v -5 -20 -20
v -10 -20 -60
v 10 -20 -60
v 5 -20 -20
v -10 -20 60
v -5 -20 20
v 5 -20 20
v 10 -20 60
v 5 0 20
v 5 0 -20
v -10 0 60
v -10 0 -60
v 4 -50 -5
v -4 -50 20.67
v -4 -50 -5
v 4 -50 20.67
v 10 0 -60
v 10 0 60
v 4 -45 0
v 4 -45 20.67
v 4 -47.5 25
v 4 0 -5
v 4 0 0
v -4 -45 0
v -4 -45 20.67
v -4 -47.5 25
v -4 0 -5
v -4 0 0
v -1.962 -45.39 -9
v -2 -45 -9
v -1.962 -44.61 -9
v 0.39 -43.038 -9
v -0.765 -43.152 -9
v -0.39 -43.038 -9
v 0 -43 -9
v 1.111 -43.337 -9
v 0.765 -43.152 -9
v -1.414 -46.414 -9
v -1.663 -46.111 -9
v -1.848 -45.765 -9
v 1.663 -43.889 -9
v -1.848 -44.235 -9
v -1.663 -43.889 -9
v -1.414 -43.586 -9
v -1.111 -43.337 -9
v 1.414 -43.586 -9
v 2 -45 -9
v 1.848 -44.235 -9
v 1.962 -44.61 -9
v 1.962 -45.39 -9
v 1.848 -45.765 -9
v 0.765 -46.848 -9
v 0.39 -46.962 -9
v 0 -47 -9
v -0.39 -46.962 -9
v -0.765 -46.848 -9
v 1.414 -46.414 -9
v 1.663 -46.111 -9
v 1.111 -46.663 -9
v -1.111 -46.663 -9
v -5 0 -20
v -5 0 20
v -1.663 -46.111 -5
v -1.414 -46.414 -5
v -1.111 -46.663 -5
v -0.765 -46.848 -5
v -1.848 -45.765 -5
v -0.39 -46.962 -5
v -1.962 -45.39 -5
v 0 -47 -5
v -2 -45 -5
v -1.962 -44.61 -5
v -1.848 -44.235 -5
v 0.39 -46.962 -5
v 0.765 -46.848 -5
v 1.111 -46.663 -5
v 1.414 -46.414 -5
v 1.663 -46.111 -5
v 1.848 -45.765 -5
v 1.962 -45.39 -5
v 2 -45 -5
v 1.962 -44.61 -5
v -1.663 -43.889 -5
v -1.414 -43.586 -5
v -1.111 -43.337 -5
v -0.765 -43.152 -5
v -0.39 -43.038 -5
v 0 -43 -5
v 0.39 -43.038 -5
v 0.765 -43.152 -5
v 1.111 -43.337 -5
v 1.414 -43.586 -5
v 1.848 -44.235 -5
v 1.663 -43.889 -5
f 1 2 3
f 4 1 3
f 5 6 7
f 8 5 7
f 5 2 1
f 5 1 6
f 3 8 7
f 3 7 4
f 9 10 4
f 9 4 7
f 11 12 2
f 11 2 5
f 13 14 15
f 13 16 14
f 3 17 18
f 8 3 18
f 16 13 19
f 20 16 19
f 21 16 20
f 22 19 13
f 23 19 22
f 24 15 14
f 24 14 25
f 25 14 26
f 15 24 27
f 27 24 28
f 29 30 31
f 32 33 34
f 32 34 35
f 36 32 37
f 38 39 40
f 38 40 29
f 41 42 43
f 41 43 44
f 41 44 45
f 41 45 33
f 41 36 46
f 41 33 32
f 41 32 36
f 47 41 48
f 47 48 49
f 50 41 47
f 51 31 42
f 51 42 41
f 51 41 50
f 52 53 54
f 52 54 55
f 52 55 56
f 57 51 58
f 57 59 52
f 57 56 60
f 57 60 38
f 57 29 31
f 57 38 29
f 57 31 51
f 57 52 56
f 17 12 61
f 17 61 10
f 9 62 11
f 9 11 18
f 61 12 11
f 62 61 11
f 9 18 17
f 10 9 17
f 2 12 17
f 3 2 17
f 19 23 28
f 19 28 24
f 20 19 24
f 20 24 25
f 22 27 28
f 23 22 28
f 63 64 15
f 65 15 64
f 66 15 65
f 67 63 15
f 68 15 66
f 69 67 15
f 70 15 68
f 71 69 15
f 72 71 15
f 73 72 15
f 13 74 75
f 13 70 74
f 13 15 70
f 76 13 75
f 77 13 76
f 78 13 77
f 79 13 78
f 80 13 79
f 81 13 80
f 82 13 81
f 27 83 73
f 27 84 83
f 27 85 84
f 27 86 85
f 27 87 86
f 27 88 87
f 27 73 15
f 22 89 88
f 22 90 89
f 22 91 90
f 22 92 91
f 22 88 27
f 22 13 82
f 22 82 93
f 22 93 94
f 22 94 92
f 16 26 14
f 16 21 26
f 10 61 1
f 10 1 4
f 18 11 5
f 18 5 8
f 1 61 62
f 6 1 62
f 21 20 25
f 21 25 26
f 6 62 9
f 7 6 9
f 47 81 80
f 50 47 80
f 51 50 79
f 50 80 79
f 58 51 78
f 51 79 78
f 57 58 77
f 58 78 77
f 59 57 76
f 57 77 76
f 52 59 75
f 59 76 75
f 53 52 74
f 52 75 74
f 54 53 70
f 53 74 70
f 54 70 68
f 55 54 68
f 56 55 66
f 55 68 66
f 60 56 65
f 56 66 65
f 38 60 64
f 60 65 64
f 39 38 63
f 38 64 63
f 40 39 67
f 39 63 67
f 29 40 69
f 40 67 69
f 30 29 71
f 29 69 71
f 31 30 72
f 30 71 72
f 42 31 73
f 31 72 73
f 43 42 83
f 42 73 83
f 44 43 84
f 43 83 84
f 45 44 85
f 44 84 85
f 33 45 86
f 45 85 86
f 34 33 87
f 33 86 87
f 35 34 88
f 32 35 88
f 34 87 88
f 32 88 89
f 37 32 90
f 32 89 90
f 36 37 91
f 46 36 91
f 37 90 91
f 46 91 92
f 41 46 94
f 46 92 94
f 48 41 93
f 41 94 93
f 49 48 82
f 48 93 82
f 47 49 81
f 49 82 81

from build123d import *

# Parameters (mm, degrees)
F0_W     = 20
F0_H     = 120
F0_W_2   = 10
F0_H_2   = 40
F1_DEPTH = 20
F3_DEPTH = 4
F4_R     = 2
F5_DEPTH = 4


with BuildPart() as f1:
    # F0 (on Front) → F1 (new body)
    with BuildSketch(Plane.XZ):
        Rectangle(F0_W, F0_H)
        Rectangle(F0_W_2, F0_H_2, mode=Mode.SUBTRACT)
    extrude(amount=F1_DEPTH)


with BuildPart() as f3:
    # F2 (on Right) → F3 (new body, symmetric)
    with BuildSketch(Plane.YZ):
        Polygon((-50, -5), (0, -5), (0, 0), (-45, 0), (-45, 20.669873), (-47.5, 25), (-50, 20.669873), align=None)
    extrude(amount=F3_DEPTH, both=True)

    # F4 (on face) → F5 (join)
    with BuildSketch(Plane(origin=(0, 0, -5), x_dir=(1, 0, 0), z_dir=(0, 0, -1))):
        with Locations((0, 45)):
            Circle(F4_R)
    extrude(amount=F5_DEPTH)


solid = Compound([f1.part, f3.part])
